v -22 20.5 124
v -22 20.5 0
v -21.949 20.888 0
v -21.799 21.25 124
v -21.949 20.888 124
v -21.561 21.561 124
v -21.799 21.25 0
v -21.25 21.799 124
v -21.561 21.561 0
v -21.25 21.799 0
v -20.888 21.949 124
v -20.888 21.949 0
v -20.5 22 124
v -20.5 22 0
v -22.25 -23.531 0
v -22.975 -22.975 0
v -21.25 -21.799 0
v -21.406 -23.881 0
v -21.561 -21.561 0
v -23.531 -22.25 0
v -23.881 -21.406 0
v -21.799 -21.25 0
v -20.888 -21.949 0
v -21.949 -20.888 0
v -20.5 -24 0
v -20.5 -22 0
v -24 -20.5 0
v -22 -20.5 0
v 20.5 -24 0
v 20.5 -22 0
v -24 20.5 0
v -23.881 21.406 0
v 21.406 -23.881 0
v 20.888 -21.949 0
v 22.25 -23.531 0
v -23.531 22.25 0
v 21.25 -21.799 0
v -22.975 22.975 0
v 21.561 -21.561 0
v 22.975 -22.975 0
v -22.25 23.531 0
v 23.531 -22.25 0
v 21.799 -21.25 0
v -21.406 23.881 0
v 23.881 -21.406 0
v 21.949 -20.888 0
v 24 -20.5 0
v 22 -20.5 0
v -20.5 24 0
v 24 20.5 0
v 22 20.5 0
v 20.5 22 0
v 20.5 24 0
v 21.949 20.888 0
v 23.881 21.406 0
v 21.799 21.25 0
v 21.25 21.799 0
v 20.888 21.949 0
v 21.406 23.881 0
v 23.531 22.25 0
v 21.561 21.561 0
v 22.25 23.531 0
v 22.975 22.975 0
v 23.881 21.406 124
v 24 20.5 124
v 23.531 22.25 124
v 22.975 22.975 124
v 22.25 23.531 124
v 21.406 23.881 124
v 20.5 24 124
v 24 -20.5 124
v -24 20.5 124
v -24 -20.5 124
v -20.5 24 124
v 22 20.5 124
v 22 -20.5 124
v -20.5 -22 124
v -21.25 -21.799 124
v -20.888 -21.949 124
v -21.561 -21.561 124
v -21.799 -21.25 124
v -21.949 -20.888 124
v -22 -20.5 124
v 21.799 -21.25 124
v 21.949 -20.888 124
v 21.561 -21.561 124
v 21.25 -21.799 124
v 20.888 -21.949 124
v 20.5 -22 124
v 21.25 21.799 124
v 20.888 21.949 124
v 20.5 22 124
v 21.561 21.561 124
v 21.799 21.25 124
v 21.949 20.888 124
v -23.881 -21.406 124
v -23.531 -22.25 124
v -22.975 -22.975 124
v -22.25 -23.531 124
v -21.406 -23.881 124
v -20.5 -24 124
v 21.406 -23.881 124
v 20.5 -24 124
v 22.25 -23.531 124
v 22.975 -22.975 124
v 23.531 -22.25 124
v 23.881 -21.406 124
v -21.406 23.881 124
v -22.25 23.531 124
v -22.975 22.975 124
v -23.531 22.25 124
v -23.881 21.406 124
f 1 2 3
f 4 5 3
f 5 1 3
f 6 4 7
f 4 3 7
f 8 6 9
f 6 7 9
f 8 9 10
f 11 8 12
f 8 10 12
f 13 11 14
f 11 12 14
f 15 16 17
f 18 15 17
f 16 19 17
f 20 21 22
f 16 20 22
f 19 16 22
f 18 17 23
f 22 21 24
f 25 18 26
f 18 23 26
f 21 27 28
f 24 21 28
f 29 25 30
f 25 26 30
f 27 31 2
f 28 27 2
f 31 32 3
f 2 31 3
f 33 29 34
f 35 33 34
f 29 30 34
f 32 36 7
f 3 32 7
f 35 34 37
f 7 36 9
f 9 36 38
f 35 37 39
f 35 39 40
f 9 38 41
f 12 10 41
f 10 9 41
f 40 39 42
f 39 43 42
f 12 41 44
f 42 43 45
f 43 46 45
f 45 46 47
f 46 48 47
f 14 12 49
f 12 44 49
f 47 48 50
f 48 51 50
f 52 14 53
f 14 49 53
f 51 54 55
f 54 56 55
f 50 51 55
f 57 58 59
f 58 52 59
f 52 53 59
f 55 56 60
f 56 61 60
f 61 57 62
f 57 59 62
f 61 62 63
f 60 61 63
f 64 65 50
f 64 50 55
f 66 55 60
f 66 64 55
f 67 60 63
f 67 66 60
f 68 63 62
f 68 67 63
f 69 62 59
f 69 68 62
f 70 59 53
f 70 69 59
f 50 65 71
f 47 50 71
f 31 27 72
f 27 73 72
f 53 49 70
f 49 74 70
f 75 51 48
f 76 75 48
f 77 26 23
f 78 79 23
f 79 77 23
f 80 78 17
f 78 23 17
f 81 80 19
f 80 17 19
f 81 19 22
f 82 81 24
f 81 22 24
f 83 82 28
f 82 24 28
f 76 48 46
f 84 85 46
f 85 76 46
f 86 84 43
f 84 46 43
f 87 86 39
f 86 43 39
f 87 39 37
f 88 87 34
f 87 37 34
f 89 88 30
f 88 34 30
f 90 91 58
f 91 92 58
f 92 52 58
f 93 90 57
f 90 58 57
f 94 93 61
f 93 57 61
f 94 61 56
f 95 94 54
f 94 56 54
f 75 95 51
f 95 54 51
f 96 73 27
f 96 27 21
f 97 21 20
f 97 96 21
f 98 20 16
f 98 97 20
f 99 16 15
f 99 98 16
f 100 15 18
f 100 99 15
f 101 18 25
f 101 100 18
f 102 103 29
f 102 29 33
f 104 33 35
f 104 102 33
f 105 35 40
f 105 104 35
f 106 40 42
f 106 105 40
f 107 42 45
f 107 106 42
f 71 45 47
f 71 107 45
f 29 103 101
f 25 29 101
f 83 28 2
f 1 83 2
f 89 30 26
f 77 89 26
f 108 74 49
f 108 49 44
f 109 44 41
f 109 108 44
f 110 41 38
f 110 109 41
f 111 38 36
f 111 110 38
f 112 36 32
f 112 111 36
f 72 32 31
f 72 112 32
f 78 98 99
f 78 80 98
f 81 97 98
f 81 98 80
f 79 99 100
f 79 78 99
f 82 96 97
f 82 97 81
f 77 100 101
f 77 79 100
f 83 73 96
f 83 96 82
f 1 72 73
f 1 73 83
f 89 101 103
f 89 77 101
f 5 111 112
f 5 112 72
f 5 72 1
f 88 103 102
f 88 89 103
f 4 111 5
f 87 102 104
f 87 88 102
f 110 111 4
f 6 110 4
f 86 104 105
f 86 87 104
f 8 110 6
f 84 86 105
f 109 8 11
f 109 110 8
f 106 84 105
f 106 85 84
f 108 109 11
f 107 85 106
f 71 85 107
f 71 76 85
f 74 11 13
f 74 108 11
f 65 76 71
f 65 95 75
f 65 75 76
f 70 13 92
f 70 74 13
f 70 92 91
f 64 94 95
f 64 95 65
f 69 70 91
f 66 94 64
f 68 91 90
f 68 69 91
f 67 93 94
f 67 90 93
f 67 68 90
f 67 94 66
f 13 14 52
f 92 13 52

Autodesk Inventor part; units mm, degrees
ref_plane "YZ Plane" through (0, 0, 0) normal (1, 0, 0) x (0, 1, 0)
ref_plane "Начальная плоскость" through (0, 0, 0) normal (0, 0, 1) x (1, 0, 0)
ref_plane "Конечная плоскость" through (0, 0, 110) normal (0, 0, 1) x (1, 0, 0)
sketch "Эскиз" plane through (0, 0, 0) normal (0, 0, 1) x (1, 0, 0)
  line L0 (-25, -20.5) -> (-25, 20.5)
  line L1 (-20.5, 25) -> (20.5, 25)
  line L2 (25, 20.5) -> (25, -20.5)
  line L3 (20.5, -25) -> (-20.5, -25)
  arc A0 (-25, -20.5) -> (-20.5, -25) centre (-20.5, -20.5) ccw
  arc A1 (-20.5, 25) -> (-25, 20.5) centre (-20.5, 20.5) ccw
  arc A2 (25, 20.5) -> (20.5, 25) centre (20.5, 20.5) ccw
  arc A3 (20.5, -25) -> (25, -20.5) centre (20.5, -20.5) ccw
  arc A4 (-20.5, 22) -> (-22, 20.5) centre (-20.5, 20.5) ccw
  line L4 (-20.5, 22) -> (20.5, 22)
  arc A5 (22, 20.5) -> (20.5, 22) centre (20.5, 20.5) ccw
  line L5 (22, 20.5) -> (22, -20.5)
  arc A6 (20.5, -22) -> (22, -20.5) centre (20.5, -20.5) ccw
  line L6 (20.5, -22) -> (-20.5, -22)
  arc A7 (-22, -20.5) -> (-20.5, -22) centre (-20.5, -20.5) ccw
  line L7 (-22, -20.5) -> (-22, 20.5)
  line L8 (0, 37.1021) -> (0, -37.1021) construction
  line L9 (-23.1021, 0) -> (23.1021, 0) construction
  dimension "d7" = 4.5
  dimension "d10" = 50
  dimension "d11" = 50
  dimension "d12" = 3
  dimension "d15" = 25
  dimension "d16" = 25
extrude "Базовый элемент" add sketch "Эскиз" along normal up to surface (110 mm away) from surface at 0
sketch "Sketch3" plane through (0, 0, 0) normal (0, 0, 1) x (1, 0, 0)
  line L0 (0, 0) -> (10, 0)
ref_plane "Work Plane3" through (0, 0, 0) normal (0, -1, 0) x (1, 0, 0)
sketch "Sketch4" plane through (0, 0, 0) normal (0, -1, 0) x (1, 0, 0)
  line L0 (-2, 0) -> (12, 0)
  line L1 (-2, 110) -> (12, 110)
  dimension "d18" = 110
sketch "Эскиз5" plane through (-20.5, -25, 110) normal (0, 0, 1) x (1, 0, 0)
  line L0 (-1.5, 45.5) -> (-1.5, 4.5) projected
  line L1 (41, 47) -> (0, 47) projected
  line L2 (41, 47) -> (0, 47) projected
  arc A0 (42.5, 45.5) -> (41, 47) centre (41, 45.5) ccw projected
  line L3 (42.5, 4.5) -> (42.5, 45.5) projected
  arc A1 (41, 3) -> (42.5, 4.5) centre (41, 4.5) ccw projected
  line L4 (0, 3) -> (41, 3) projected
  arc A2 (-1.5, 4.5) -> (0, 3) centre (0, 4.5) ccw projected
  line L5 (-1.5, 45.5) -> (-1.5, 4.5) projected
  arc A3 (0, 47) -> (-1.5, 45.5) centre (0, 45.5) ccw projected
  line L6 (-4.5, 4.5) -> (-4.5, 45.5) projected
  arc A4 (-4.5, 4.5) -> (0, 0) centre (0, 4.5) ccw projected
  line L7 (41, 0) -> (0, 0) projected
  arc A5 (41, 0) -> (45.5, 4.5) centre (41, 4.5) ccw projected
  line L8 (45.5, 45.5) -> (45.5, 4.5) projected
  arc A6 (45.5, 45.5) -> (41, 50) centre (41, 45.5) ccw projected
  line L9 (0, 50) -> (41, 50) projected
  arc A7 (0, 50) -> (-4.5, 45.5) centre (0, 45.5) ccw projected
  point P0 (20.5, 25)
  point P1 (0, 47)
extrude "Выдавливание2" add sketch "Эскиз5" along normal blind 14
sketch "Эскиз6" plane through (-20.5, -25, 124) normal (0, 0, 1) x (1, 0, 0)
  line L0 (45.5, 4.5) -> (45.5, 45.5) projected
  arc A0 (45.5, 45.5) -> (41, 50) centre (41, 45.5) ccw projected
  line L1 (41, 50) -> (0, 50) projected
  arc A1 (0, 50) -> (-4.5, 45.5) centre (0, 45.5) ccw projected
  line L2 (-4.5, 45.5) -> (-4.5, 4.5) projected
  arc A2 (-4.5, 4.5) -> (0, 0) centre (0, 4.5) ccw projected
  line L3 (0, 0) -> (41, 0) projected
  arc A3 (41, 0) -> (45.5, 4.5) centre (41, 4.5) ccw projected
  arc A4 (42.5, 45.5) -> (41, 47) centre (41, 45.5) ccw projected
  line L4 (42.5, 45.5) -> (42.5, 4.5) projected
  arc A5 (41, 3) -> (42.5, 4.5) centre (41, 4.5) ccw projected
  line L5 (41, 3) -> (0, 3) projected
  arc A6 (-1.5, 4.5) -> (0, 3) centre (0, 4.5) ccw projected
  line L6 (-1.5, 4.5) -> (-1.5, 45.5) projected
  arc A7 (0, 47) -> (-1.5, 45.5) centre (0, 45.5) ccw projected
  line L7 (0, 47) -> (41, 47) projected
  line L8 (0, 49) -> (41, 49)
  arc A8 (44.5, 45.5) -> (41, 49) centre (41, 45.5) ccw
  line L9 (44.5, 45.5) -> (44.5, 4.5)
  arc A9 (41, 1) -> (44.5, 4.5) centre (41, 4.5) ccw
  line L10 (41, 1) -> (0, 1)
  arc A10 (-3.5, 4.5) -> (0, 1) centre (0, 4.5) ccw
  line L11 (-3.5, 4.5) -> (-3.5, 45.5)
  arc A11 (0, 49) -> (-3.5, 45.5) centre (0, 45.5) ccw
  point P0 (20.5, 25)
  dimension "d21" = 3
  dimension "d22" = 1
extrude "Выдавливание3" cut sketch "Эскиз6" against normal blind 150.25 contours A3 L3 A2 L2 A1 L1 A0 L0
equation "\"d7\" = G_IR"
equation "\"d10\" = G_H"
equation "\"d11\" = G_W"
equation "\"d12\" = G_T"
equation "\"d15\" = 0.5 * d10"
equation "\"d16\" = 0.5 * d11"
equation "\"d3\" = G_L"
equation "\"G_W\" = 50"
equation "\"G_H\" = 50"
equation "\"G_T\" = 3"
equation "\"G_IR\" = 1.5 * G_T"
equation "\"G_L\" = d18"
equation "\"G_OFFSET_START\" = 0"
equation "\"G_OFFSET_END\" = 0"
properties part number "Труба 50x50x3 -110 ГОСТ 8639-82" material "Сталь нержавеющая AISI 202"
